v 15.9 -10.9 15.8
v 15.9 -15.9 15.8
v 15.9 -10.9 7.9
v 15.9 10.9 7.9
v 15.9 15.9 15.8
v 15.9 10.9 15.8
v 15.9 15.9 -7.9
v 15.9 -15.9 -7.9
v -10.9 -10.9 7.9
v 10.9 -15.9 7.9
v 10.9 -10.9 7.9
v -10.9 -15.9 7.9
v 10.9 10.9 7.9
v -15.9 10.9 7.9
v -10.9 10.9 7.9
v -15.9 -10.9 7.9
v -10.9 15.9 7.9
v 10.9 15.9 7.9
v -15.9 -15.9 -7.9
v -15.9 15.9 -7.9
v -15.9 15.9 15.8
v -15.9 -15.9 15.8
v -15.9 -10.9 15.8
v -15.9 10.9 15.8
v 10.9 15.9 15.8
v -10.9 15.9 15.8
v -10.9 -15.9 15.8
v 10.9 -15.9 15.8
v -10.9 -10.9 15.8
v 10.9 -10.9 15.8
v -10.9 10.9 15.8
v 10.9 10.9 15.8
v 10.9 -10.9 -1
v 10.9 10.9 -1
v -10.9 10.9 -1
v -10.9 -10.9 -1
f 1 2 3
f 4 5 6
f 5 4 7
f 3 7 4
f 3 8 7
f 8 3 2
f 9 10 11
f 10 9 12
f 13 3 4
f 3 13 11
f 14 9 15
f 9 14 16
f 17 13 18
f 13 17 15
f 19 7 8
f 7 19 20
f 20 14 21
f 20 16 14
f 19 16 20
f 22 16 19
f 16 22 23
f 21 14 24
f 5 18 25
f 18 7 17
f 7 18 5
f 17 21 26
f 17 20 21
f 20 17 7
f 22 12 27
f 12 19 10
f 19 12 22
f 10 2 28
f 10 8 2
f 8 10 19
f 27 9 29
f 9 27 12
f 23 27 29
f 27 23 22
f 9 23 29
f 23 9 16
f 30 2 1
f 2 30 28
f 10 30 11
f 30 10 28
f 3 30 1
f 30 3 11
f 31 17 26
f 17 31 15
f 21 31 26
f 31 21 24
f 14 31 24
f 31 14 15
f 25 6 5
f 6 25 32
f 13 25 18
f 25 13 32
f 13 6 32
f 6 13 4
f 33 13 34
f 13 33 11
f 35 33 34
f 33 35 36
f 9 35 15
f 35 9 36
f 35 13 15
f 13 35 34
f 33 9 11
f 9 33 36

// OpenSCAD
module c_shaped_bracket() {
    difference() {
        // Outer frame
        union() {
            // Main body
            cube([31.8, 31.8, 15.8], center=true);
            
            // Corner bosses
            translate([-15.9, -15.9, 0])
                cube([5, 5, 15.8]);
            translate([10.9, -15.9, 0])
                cube([5, 5, 15.8]);
            translate([-15.9, 10.9, 0])
                cube([5, 5, 15.8]);
            translate([10.9, 10.9, 0])
                cube([5, 5, 15.8]);
        }
        
        // Inner cutout
        translate([-10.9, -10.9, -1])
            cube([21.8, 21.8, 17.8]);
    }
}

c_shaped_bracket();
